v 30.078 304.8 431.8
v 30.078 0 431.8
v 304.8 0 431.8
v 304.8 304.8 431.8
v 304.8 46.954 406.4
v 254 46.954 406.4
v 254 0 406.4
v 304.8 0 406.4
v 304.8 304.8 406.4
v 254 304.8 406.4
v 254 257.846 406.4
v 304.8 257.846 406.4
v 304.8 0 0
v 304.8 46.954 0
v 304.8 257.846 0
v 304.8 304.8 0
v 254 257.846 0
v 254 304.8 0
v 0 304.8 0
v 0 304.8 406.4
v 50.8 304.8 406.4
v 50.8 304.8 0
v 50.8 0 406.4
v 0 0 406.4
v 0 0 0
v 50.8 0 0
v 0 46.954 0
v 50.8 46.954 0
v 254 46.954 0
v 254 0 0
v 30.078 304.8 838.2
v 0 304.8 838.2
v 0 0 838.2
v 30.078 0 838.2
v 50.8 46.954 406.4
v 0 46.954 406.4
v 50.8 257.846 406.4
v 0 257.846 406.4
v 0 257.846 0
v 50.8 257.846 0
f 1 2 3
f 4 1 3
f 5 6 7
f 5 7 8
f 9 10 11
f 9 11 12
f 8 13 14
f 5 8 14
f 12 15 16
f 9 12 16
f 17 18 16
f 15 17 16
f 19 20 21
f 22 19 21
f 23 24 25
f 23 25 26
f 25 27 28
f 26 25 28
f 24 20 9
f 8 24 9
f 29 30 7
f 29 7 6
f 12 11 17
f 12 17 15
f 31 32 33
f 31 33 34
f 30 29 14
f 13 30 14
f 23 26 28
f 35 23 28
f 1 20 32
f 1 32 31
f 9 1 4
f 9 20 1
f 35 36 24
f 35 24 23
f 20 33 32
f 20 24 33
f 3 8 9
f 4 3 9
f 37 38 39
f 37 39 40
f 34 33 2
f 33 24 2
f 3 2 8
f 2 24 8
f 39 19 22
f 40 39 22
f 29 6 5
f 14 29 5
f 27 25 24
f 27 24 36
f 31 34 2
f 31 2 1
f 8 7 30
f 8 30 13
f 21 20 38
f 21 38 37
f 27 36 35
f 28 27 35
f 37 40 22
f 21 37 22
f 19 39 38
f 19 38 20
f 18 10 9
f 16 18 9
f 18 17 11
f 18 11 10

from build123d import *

# Parameters (mm, degrees)
F0_W     = 50.8
F0_H     = 46.954226
F1_DEPTH = 406.4
F2_W     = 304.8
F2_H     = 304.8
F3_DEPTH = 25.4
F4_W     = 30.078378
F4_H     = 304.8
F5_DEPTH = 406.4


with BuildPart() as f1:
    # F0 (on Top) → F1 (new body)
    with BuildSketch(Plane.XY):
        with Locations((279.4, 23.477113)):
            Rectangle(F0_W, F0_H)
        with Locations((25.4, 23.477113)):
            Rectangle(F0_W, F0_H)
        with Locations((25.4, 281.322887)):
            Rectangle(F0_W, F0_H)
        with Locations((279.4, 281.322887)):
            Rectangle(F0_W, F0_H)
    extrude(amount=F1_DEPTH)


with BuildPart() as f3:
    # F2 (on face) → F3 (new body)
    with BuildSketch(Plane.XY.offset(406.4)):
        with Locations((152.4, 152.4)):
            Rectangle(F2_W, F2_H)
    extrude(amount=F3_DEPTH)

    # F4 (on face) → F5 (join)
    with BuildSketch(Plane.XY.offset(431.8)):
        with Locations((15.039189, 152.4)):
            Rectangle(F4_W, F4_H)
    extrude(amount=F5_DEPTH)


solid = Compound([f1.part, f3.part])
